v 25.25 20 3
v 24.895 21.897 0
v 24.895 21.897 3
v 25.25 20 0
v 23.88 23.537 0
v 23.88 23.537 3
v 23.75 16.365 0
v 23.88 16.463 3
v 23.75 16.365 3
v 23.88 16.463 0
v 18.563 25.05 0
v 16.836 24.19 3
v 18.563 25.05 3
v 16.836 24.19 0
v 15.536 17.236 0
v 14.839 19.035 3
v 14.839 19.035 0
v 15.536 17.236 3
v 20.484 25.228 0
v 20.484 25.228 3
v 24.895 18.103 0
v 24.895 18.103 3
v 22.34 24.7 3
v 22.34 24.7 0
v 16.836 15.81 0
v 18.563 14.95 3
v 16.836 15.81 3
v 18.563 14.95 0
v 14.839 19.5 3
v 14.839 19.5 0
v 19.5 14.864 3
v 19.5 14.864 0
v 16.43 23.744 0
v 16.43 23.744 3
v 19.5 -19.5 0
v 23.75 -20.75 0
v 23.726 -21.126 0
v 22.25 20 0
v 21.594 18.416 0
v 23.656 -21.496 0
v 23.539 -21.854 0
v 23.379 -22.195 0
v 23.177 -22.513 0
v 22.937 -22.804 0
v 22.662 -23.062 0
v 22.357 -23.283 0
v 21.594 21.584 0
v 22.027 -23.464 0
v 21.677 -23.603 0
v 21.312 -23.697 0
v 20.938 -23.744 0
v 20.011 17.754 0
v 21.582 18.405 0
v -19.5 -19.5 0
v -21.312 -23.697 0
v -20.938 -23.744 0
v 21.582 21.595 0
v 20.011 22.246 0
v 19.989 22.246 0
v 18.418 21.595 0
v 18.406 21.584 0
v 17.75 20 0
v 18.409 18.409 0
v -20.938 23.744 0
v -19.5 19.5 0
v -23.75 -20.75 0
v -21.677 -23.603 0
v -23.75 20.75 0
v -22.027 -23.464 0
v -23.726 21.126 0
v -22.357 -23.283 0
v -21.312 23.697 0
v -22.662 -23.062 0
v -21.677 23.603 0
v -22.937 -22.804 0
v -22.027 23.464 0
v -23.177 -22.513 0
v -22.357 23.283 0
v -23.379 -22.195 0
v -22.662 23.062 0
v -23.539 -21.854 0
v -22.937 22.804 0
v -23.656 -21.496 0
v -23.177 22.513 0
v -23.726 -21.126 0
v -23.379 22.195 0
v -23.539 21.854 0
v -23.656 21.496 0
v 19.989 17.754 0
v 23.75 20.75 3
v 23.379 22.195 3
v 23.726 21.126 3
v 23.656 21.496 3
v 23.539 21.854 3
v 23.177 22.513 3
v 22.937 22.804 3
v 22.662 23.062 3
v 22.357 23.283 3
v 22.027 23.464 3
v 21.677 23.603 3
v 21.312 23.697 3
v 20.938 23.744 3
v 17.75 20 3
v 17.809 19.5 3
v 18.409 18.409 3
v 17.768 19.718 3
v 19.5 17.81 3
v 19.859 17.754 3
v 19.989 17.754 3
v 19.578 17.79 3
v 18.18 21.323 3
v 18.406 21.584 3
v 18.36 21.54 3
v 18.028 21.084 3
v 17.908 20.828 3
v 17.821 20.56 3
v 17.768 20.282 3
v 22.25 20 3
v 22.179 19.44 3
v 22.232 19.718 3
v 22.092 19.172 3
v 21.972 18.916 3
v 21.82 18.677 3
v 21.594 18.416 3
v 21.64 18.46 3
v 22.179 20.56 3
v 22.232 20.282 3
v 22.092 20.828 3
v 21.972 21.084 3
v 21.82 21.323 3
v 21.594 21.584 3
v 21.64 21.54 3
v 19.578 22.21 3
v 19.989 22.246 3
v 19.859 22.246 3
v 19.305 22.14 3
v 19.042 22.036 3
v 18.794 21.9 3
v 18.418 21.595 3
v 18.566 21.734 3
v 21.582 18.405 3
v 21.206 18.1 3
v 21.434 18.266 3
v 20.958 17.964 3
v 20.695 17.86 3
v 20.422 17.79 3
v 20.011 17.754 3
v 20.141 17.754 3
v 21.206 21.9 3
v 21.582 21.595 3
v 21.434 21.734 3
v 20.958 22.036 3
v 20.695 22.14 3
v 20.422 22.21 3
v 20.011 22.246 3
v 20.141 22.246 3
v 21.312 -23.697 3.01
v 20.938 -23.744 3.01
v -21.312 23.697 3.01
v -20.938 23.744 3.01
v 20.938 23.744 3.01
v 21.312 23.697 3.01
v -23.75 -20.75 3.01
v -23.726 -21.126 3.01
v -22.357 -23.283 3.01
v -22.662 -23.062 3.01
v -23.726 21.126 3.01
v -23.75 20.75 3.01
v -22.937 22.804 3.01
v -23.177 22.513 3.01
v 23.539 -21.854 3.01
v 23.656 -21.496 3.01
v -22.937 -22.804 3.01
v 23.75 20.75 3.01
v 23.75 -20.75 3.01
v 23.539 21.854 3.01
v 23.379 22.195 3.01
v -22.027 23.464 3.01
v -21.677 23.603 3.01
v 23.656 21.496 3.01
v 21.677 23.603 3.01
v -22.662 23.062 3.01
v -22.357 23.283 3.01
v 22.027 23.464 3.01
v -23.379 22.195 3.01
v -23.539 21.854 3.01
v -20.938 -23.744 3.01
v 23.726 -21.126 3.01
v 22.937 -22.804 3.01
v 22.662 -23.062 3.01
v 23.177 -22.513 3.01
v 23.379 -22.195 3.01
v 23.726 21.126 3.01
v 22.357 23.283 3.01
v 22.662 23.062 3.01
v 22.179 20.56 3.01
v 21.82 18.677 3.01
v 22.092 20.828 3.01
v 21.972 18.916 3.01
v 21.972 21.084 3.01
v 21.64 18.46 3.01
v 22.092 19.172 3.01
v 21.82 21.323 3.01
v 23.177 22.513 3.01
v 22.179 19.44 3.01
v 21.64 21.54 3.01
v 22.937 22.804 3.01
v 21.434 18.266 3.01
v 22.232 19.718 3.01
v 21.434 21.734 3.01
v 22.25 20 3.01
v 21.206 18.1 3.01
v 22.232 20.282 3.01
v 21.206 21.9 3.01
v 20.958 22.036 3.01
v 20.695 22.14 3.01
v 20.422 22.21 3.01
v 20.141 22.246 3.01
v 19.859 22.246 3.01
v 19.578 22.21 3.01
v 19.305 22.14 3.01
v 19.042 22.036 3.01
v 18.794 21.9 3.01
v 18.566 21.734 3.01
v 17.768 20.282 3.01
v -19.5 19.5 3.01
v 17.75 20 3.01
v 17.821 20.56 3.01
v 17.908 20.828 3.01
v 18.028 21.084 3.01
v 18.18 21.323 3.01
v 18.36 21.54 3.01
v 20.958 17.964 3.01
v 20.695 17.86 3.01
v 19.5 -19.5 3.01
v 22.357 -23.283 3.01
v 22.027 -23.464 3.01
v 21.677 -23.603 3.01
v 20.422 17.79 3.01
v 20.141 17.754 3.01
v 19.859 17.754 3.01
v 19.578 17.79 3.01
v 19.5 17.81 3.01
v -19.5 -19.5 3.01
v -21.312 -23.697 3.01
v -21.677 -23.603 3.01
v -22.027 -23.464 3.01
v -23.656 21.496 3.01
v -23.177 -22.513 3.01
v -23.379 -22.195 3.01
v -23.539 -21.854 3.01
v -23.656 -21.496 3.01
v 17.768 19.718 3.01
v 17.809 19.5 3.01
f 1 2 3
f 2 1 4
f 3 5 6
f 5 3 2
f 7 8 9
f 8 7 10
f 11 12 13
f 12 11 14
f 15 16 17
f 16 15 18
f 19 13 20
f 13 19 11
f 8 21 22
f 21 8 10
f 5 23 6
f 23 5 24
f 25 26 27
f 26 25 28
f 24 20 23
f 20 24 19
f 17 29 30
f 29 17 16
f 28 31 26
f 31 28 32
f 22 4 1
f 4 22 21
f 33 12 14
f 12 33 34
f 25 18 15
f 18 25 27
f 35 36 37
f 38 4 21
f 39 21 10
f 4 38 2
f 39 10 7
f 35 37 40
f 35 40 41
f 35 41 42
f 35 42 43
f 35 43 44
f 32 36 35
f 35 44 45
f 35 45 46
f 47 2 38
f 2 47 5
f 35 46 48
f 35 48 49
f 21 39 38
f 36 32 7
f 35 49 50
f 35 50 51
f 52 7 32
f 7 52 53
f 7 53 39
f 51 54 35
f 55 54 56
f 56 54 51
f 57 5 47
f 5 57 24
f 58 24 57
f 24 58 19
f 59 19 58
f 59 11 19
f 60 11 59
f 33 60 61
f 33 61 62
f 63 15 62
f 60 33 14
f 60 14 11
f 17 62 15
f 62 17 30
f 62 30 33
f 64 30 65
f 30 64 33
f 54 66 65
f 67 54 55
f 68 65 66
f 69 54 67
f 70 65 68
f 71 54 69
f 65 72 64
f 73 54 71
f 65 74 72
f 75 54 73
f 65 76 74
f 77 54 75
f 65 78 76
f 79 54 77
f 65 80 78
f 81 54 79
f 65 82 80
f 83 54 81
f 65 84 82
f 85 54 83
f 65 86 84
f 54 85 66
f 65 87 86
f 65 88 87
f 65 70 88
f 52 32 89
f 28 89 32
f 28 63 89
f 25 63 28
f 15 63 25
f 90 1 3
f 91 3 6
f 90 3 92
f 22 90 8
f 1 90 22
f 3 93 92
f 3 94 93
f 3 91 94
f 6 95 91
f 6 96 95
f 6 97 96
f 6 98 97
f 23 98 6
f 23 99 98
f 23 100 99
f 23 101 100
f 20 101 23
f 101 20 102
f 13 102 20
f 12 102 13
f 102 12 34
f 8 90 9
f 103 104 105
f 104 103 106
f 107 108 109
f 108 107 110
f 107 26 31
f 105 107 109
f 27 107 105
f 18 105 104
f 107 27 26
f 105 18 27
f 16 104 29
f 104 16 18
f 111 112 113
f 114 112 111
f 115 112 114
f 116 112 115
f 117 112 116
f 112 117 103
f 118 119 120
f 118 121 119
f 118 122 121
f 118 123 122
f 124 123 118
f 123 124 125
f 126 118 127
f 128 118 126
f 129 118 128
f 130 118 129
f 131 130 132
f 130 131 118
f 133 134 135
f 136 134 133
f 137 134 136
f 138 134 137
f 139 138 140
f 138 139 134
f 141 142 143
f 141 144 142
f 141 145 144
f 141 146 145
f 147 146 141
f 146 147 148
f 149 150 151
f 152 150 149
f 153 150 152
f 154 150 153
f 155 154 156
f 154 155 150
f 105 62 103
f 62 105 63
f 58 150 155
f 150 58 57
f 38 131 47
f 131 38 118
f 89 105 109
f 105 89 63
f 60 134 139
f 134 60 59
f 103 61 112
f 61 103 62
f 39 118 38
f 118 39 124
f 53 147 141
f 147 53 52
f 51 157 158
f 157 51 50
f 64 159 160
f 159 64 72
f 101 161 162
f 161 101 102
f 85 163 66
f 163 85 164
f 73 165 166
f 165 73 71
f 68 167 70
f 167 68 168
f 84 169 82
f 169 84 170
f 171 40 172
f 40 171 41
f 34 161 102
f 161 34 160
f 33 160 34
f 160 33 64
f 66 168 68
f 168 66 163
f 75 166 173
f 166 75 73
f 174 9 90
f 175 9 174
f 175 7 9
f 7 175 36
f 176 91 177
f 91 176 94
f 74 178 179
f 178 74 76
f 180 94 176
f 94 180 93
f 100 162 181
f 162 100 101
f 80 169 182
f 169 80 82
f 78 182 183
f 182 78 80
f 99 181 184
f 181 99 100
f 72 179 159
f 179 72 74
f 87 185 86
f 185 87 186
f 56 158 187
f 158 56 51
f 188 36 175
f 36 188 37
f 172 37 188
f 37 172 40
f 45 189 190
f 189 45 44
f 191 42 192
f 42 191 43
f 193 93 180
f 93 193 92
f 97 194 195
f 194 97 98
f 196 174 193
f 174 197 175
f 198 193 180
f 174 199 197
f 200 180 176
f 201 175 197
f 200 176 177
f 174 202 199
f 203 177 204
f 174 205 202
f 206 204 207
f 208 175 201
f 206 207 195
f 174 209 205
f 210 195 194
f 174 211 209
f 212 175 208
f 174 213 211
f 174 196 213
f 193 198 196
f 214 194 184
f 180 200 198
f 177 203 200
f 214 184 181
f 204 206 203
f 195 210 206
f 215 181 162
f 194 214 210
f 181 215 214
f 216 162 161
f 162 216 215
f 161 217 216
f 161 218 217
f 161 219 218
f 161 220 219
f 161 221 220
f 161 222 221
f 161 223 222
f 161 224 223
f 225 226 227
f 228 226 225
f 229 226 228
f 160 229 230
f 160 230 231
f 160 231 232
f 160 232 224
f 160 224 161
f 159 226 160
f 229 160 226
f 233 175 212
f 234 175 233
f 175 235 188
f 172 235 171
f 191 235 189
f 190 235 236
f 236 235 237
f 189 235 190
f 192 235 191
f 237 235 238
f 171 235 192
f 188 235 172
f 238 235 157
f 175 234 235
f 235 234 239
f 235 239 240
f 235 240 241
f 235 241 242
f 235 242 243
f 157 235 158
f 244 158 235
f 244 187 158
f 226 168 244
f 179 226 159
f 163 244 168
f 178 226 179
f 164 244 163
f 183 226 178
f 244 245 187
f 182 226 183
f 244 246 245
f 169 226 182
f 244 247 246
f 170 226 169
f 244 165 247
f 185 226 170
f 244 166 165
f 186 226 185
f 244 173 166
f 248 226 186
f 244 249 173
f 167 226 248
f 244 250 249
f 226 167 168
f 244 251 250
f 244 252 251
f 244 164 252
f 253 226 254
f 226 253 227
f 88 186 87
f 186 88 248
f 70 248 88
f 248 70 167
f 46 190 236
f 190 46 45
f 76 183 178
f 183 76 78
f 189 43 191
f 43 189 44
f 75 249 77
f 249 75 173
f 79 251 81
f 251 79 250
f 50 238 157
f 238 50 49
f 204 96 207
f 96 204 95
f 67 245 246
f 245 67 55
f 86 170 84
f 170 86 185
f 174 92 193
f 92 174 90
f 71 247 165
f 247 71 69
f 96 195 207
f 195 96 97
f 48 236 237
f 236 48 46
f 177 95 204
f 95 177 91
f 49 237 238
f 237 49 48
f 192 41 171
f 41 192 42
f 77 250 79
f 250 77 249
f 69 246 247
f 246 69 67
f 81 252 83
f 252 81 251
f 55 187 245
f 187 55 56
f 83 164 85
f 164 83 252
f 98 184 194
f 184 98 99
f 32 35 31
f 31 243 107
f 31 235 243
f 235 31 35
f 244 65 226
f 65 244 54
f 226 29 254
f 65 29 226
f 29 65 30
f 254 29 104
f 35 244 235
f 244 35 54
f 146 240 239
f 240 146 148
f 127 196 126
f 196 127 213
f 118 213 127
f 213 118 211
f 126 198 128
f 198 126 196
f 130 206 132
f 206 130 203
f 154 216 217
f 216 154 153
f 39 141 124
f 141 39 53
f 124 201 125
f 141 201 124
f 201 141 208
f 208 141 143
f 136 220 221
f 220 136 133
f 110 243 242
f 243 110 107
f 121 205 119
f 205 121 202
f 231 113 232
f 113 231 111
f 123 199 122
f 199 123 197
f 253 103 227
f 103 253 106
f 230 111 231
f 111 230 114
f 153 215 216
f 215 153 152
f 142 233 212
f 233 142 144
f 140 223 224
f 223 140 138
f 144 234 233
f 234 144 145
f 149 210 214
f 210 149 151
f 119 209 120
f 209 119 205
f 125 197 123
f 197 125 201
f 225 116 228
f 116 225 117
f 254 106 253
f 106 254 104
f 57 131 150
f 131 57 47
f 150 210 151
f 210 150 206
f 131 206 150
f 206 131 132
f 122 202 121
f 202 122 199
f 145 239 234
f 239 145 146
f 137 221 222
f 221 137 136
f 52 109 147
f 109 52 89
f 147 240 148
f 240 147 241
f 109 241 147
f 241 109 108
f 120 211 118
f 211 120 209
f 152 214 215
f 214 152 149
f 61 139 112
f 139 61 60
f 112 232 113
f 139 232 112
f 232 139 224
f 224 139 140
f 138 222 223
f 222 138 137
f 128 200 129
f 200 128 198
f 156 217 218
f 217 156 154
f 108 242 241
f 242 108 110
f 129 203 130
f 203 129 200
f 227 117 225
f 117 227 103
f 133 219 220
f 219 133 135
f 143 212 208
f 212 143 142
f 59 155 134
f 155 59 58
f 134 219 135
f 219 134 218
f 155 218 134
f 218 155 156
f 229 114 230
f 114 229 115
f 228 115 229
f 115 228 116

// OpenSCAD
//keychain-Customizable Lithopane by Mark G. Peeters 
//http://www.thingiverse.com/thing:308109
//version 1.3 
//if you are using openSCAD then you are cool! You can get DAT files for local use using this tool
//http://customizer.makerbot.com/image_surface
// i used the nice code for adjusting layers from here:
//http://www.thingiverse.com/thing:74322

// preview[view:south, tilt:top]
//
//
/* [Image] */

// Load a 100x100 pixel image.(images will be stretched to fit) Simple photos work best. Don't forget to click the Invert Colors checkbox! *** ALSO IF YOU HAVE LETTERS IN YOUR IMAGE make sure to reverse the image before uploading so the letters are not backwards.
image_file = "image-surface.dat"; // [image_surface:100x100]

/* [Adjustments] */

//shape NOTE: ALL units are in millimeters (mm)
shape = 1;//[0:circle, 1:square]
//over all size of the keychain. you picked
tag_size = 40;// [20:70]
// size for keyring 4.5 or 5 is good.
ring_hole=4.5;
// What layer height will you slice this at?  The thinner the better.
layer_height = 0.2;
//Use plastic color opacity to set this. The lower the layer height, the more layers you can use. you picked
number_of_layers = 12; // [5:30]
//Width of boarder lining the keychain (3mm is fine)
boarder_width = 3;//
//boarder thickness lining the keychain (at least 3mm for strength)
boarder_thick = 3;//

/* [Hidden] */

// base (white) will always be 2 layers thick
min_layer_height = layer_height*2;
height = layer_height*number_of_layers;
maxheight = height+min_layer_height;


// Make litho and trim bottom and sides
  difference() { //diff 1
  translate([0, 0, min_layer_height]) scale([(tag_size/100),(tag_size/100),height]) surface(file=image_file, center=true, convexity=5); //litosurface moved up min_layer_height
  translate([0,0,-(maxheight)]) linear_extrude(height=maxheight) square(tag_size, center=true);//cutting bottom off surface

if (shape==0) {//you picked circle shape------------------------------------
difference() {  //diff make tube to trim lith
                translate([0, 0, -7]) cylinder(maxheight+15,r= tag_size); //outside
                translate([0, 0, -9]) cylinder(maxheight+18,r= (tag_size/2)); //inside
               } //end diff make tube
translate([0, tag_size/2+boarder_width, -1])cylinder(maxheight+2,r= ring_hole/2); //ring hole
}//end if you picked circle------------------------------------------

if (shape==1) {//you picked square shape------------------------------------
difference() {  //diff make cube to trim litho
                translate([0, 0, -7]) cube(tag_size+15,center=true); //outside
               translate([0, 0, -9]) cube(tag_size,center=true); //inside
               } //end diff make tube
translate([tag_size/2, tag_size/2, -1])cylinder(maxheight+2,r= ring_hole/2); //ring hole
}//end if you picked square

}//end diff 1

//add boarder and loop
if (shape==0) {//you picked circle shape--------------------------
translate([0, tag_size/2+boarder_width, 0]) //move loop
difference(){//make loop
cylinder(boarder_thick,r=boarder_width+ring_hole/2); //ring support
translate([0, 0, -1])cylinder(boarder_thick+2,r= ring_hole/2); //ring hole
}

difference() {  //diff make frame tube
                 cylinder(boarder_thick,r= (tag_size/2)+boarder_width); //outside
                 cylinder(boarder_thick+1,r= (tag_size/2.02)); //inside
translate([0, tag_size/2+boarder_width, -1])cylinder(boarder_thick+2,r= ring_hole/2); //ring hole
                } //end diff make frame tube

}//end if you picked circle------------------------------------------

if (shape==1) {//you picked square shape------------------------------------
translate([tag_size/2, tag_size/2, 0]) //move loop
difference(){//make loop
cylinder(boarder_thick,r=boarder_width+ring_hole/2); //ring support
translate([0, 0, -1])cylinder(boarder_thick+2,r= ring_hole/2); //ring hole
}

difference() {  //diff make frame tube
    $fn=50;
    minkowski()
    {
                 translate([0,0,boarder_thick/2]) cube([tag_size+boarder_width*.5,tag_size+boarder_width*.5,boarder_thick],center=true); //outside
        cylinder(r=3,h=.01);

    }
                 translate([0,0,boarder_thick/2]) cube([tag_size-1,tag_size-1,boarder_thick+1],center=true); //inside
translate([tag_size/2, tag_size/2, -1])cylinder(boarder_thick+2,r= ring_hole/2); //ring hole                
                        } //end diff make frame tube
}//end if you picked square------------------------------------------------
